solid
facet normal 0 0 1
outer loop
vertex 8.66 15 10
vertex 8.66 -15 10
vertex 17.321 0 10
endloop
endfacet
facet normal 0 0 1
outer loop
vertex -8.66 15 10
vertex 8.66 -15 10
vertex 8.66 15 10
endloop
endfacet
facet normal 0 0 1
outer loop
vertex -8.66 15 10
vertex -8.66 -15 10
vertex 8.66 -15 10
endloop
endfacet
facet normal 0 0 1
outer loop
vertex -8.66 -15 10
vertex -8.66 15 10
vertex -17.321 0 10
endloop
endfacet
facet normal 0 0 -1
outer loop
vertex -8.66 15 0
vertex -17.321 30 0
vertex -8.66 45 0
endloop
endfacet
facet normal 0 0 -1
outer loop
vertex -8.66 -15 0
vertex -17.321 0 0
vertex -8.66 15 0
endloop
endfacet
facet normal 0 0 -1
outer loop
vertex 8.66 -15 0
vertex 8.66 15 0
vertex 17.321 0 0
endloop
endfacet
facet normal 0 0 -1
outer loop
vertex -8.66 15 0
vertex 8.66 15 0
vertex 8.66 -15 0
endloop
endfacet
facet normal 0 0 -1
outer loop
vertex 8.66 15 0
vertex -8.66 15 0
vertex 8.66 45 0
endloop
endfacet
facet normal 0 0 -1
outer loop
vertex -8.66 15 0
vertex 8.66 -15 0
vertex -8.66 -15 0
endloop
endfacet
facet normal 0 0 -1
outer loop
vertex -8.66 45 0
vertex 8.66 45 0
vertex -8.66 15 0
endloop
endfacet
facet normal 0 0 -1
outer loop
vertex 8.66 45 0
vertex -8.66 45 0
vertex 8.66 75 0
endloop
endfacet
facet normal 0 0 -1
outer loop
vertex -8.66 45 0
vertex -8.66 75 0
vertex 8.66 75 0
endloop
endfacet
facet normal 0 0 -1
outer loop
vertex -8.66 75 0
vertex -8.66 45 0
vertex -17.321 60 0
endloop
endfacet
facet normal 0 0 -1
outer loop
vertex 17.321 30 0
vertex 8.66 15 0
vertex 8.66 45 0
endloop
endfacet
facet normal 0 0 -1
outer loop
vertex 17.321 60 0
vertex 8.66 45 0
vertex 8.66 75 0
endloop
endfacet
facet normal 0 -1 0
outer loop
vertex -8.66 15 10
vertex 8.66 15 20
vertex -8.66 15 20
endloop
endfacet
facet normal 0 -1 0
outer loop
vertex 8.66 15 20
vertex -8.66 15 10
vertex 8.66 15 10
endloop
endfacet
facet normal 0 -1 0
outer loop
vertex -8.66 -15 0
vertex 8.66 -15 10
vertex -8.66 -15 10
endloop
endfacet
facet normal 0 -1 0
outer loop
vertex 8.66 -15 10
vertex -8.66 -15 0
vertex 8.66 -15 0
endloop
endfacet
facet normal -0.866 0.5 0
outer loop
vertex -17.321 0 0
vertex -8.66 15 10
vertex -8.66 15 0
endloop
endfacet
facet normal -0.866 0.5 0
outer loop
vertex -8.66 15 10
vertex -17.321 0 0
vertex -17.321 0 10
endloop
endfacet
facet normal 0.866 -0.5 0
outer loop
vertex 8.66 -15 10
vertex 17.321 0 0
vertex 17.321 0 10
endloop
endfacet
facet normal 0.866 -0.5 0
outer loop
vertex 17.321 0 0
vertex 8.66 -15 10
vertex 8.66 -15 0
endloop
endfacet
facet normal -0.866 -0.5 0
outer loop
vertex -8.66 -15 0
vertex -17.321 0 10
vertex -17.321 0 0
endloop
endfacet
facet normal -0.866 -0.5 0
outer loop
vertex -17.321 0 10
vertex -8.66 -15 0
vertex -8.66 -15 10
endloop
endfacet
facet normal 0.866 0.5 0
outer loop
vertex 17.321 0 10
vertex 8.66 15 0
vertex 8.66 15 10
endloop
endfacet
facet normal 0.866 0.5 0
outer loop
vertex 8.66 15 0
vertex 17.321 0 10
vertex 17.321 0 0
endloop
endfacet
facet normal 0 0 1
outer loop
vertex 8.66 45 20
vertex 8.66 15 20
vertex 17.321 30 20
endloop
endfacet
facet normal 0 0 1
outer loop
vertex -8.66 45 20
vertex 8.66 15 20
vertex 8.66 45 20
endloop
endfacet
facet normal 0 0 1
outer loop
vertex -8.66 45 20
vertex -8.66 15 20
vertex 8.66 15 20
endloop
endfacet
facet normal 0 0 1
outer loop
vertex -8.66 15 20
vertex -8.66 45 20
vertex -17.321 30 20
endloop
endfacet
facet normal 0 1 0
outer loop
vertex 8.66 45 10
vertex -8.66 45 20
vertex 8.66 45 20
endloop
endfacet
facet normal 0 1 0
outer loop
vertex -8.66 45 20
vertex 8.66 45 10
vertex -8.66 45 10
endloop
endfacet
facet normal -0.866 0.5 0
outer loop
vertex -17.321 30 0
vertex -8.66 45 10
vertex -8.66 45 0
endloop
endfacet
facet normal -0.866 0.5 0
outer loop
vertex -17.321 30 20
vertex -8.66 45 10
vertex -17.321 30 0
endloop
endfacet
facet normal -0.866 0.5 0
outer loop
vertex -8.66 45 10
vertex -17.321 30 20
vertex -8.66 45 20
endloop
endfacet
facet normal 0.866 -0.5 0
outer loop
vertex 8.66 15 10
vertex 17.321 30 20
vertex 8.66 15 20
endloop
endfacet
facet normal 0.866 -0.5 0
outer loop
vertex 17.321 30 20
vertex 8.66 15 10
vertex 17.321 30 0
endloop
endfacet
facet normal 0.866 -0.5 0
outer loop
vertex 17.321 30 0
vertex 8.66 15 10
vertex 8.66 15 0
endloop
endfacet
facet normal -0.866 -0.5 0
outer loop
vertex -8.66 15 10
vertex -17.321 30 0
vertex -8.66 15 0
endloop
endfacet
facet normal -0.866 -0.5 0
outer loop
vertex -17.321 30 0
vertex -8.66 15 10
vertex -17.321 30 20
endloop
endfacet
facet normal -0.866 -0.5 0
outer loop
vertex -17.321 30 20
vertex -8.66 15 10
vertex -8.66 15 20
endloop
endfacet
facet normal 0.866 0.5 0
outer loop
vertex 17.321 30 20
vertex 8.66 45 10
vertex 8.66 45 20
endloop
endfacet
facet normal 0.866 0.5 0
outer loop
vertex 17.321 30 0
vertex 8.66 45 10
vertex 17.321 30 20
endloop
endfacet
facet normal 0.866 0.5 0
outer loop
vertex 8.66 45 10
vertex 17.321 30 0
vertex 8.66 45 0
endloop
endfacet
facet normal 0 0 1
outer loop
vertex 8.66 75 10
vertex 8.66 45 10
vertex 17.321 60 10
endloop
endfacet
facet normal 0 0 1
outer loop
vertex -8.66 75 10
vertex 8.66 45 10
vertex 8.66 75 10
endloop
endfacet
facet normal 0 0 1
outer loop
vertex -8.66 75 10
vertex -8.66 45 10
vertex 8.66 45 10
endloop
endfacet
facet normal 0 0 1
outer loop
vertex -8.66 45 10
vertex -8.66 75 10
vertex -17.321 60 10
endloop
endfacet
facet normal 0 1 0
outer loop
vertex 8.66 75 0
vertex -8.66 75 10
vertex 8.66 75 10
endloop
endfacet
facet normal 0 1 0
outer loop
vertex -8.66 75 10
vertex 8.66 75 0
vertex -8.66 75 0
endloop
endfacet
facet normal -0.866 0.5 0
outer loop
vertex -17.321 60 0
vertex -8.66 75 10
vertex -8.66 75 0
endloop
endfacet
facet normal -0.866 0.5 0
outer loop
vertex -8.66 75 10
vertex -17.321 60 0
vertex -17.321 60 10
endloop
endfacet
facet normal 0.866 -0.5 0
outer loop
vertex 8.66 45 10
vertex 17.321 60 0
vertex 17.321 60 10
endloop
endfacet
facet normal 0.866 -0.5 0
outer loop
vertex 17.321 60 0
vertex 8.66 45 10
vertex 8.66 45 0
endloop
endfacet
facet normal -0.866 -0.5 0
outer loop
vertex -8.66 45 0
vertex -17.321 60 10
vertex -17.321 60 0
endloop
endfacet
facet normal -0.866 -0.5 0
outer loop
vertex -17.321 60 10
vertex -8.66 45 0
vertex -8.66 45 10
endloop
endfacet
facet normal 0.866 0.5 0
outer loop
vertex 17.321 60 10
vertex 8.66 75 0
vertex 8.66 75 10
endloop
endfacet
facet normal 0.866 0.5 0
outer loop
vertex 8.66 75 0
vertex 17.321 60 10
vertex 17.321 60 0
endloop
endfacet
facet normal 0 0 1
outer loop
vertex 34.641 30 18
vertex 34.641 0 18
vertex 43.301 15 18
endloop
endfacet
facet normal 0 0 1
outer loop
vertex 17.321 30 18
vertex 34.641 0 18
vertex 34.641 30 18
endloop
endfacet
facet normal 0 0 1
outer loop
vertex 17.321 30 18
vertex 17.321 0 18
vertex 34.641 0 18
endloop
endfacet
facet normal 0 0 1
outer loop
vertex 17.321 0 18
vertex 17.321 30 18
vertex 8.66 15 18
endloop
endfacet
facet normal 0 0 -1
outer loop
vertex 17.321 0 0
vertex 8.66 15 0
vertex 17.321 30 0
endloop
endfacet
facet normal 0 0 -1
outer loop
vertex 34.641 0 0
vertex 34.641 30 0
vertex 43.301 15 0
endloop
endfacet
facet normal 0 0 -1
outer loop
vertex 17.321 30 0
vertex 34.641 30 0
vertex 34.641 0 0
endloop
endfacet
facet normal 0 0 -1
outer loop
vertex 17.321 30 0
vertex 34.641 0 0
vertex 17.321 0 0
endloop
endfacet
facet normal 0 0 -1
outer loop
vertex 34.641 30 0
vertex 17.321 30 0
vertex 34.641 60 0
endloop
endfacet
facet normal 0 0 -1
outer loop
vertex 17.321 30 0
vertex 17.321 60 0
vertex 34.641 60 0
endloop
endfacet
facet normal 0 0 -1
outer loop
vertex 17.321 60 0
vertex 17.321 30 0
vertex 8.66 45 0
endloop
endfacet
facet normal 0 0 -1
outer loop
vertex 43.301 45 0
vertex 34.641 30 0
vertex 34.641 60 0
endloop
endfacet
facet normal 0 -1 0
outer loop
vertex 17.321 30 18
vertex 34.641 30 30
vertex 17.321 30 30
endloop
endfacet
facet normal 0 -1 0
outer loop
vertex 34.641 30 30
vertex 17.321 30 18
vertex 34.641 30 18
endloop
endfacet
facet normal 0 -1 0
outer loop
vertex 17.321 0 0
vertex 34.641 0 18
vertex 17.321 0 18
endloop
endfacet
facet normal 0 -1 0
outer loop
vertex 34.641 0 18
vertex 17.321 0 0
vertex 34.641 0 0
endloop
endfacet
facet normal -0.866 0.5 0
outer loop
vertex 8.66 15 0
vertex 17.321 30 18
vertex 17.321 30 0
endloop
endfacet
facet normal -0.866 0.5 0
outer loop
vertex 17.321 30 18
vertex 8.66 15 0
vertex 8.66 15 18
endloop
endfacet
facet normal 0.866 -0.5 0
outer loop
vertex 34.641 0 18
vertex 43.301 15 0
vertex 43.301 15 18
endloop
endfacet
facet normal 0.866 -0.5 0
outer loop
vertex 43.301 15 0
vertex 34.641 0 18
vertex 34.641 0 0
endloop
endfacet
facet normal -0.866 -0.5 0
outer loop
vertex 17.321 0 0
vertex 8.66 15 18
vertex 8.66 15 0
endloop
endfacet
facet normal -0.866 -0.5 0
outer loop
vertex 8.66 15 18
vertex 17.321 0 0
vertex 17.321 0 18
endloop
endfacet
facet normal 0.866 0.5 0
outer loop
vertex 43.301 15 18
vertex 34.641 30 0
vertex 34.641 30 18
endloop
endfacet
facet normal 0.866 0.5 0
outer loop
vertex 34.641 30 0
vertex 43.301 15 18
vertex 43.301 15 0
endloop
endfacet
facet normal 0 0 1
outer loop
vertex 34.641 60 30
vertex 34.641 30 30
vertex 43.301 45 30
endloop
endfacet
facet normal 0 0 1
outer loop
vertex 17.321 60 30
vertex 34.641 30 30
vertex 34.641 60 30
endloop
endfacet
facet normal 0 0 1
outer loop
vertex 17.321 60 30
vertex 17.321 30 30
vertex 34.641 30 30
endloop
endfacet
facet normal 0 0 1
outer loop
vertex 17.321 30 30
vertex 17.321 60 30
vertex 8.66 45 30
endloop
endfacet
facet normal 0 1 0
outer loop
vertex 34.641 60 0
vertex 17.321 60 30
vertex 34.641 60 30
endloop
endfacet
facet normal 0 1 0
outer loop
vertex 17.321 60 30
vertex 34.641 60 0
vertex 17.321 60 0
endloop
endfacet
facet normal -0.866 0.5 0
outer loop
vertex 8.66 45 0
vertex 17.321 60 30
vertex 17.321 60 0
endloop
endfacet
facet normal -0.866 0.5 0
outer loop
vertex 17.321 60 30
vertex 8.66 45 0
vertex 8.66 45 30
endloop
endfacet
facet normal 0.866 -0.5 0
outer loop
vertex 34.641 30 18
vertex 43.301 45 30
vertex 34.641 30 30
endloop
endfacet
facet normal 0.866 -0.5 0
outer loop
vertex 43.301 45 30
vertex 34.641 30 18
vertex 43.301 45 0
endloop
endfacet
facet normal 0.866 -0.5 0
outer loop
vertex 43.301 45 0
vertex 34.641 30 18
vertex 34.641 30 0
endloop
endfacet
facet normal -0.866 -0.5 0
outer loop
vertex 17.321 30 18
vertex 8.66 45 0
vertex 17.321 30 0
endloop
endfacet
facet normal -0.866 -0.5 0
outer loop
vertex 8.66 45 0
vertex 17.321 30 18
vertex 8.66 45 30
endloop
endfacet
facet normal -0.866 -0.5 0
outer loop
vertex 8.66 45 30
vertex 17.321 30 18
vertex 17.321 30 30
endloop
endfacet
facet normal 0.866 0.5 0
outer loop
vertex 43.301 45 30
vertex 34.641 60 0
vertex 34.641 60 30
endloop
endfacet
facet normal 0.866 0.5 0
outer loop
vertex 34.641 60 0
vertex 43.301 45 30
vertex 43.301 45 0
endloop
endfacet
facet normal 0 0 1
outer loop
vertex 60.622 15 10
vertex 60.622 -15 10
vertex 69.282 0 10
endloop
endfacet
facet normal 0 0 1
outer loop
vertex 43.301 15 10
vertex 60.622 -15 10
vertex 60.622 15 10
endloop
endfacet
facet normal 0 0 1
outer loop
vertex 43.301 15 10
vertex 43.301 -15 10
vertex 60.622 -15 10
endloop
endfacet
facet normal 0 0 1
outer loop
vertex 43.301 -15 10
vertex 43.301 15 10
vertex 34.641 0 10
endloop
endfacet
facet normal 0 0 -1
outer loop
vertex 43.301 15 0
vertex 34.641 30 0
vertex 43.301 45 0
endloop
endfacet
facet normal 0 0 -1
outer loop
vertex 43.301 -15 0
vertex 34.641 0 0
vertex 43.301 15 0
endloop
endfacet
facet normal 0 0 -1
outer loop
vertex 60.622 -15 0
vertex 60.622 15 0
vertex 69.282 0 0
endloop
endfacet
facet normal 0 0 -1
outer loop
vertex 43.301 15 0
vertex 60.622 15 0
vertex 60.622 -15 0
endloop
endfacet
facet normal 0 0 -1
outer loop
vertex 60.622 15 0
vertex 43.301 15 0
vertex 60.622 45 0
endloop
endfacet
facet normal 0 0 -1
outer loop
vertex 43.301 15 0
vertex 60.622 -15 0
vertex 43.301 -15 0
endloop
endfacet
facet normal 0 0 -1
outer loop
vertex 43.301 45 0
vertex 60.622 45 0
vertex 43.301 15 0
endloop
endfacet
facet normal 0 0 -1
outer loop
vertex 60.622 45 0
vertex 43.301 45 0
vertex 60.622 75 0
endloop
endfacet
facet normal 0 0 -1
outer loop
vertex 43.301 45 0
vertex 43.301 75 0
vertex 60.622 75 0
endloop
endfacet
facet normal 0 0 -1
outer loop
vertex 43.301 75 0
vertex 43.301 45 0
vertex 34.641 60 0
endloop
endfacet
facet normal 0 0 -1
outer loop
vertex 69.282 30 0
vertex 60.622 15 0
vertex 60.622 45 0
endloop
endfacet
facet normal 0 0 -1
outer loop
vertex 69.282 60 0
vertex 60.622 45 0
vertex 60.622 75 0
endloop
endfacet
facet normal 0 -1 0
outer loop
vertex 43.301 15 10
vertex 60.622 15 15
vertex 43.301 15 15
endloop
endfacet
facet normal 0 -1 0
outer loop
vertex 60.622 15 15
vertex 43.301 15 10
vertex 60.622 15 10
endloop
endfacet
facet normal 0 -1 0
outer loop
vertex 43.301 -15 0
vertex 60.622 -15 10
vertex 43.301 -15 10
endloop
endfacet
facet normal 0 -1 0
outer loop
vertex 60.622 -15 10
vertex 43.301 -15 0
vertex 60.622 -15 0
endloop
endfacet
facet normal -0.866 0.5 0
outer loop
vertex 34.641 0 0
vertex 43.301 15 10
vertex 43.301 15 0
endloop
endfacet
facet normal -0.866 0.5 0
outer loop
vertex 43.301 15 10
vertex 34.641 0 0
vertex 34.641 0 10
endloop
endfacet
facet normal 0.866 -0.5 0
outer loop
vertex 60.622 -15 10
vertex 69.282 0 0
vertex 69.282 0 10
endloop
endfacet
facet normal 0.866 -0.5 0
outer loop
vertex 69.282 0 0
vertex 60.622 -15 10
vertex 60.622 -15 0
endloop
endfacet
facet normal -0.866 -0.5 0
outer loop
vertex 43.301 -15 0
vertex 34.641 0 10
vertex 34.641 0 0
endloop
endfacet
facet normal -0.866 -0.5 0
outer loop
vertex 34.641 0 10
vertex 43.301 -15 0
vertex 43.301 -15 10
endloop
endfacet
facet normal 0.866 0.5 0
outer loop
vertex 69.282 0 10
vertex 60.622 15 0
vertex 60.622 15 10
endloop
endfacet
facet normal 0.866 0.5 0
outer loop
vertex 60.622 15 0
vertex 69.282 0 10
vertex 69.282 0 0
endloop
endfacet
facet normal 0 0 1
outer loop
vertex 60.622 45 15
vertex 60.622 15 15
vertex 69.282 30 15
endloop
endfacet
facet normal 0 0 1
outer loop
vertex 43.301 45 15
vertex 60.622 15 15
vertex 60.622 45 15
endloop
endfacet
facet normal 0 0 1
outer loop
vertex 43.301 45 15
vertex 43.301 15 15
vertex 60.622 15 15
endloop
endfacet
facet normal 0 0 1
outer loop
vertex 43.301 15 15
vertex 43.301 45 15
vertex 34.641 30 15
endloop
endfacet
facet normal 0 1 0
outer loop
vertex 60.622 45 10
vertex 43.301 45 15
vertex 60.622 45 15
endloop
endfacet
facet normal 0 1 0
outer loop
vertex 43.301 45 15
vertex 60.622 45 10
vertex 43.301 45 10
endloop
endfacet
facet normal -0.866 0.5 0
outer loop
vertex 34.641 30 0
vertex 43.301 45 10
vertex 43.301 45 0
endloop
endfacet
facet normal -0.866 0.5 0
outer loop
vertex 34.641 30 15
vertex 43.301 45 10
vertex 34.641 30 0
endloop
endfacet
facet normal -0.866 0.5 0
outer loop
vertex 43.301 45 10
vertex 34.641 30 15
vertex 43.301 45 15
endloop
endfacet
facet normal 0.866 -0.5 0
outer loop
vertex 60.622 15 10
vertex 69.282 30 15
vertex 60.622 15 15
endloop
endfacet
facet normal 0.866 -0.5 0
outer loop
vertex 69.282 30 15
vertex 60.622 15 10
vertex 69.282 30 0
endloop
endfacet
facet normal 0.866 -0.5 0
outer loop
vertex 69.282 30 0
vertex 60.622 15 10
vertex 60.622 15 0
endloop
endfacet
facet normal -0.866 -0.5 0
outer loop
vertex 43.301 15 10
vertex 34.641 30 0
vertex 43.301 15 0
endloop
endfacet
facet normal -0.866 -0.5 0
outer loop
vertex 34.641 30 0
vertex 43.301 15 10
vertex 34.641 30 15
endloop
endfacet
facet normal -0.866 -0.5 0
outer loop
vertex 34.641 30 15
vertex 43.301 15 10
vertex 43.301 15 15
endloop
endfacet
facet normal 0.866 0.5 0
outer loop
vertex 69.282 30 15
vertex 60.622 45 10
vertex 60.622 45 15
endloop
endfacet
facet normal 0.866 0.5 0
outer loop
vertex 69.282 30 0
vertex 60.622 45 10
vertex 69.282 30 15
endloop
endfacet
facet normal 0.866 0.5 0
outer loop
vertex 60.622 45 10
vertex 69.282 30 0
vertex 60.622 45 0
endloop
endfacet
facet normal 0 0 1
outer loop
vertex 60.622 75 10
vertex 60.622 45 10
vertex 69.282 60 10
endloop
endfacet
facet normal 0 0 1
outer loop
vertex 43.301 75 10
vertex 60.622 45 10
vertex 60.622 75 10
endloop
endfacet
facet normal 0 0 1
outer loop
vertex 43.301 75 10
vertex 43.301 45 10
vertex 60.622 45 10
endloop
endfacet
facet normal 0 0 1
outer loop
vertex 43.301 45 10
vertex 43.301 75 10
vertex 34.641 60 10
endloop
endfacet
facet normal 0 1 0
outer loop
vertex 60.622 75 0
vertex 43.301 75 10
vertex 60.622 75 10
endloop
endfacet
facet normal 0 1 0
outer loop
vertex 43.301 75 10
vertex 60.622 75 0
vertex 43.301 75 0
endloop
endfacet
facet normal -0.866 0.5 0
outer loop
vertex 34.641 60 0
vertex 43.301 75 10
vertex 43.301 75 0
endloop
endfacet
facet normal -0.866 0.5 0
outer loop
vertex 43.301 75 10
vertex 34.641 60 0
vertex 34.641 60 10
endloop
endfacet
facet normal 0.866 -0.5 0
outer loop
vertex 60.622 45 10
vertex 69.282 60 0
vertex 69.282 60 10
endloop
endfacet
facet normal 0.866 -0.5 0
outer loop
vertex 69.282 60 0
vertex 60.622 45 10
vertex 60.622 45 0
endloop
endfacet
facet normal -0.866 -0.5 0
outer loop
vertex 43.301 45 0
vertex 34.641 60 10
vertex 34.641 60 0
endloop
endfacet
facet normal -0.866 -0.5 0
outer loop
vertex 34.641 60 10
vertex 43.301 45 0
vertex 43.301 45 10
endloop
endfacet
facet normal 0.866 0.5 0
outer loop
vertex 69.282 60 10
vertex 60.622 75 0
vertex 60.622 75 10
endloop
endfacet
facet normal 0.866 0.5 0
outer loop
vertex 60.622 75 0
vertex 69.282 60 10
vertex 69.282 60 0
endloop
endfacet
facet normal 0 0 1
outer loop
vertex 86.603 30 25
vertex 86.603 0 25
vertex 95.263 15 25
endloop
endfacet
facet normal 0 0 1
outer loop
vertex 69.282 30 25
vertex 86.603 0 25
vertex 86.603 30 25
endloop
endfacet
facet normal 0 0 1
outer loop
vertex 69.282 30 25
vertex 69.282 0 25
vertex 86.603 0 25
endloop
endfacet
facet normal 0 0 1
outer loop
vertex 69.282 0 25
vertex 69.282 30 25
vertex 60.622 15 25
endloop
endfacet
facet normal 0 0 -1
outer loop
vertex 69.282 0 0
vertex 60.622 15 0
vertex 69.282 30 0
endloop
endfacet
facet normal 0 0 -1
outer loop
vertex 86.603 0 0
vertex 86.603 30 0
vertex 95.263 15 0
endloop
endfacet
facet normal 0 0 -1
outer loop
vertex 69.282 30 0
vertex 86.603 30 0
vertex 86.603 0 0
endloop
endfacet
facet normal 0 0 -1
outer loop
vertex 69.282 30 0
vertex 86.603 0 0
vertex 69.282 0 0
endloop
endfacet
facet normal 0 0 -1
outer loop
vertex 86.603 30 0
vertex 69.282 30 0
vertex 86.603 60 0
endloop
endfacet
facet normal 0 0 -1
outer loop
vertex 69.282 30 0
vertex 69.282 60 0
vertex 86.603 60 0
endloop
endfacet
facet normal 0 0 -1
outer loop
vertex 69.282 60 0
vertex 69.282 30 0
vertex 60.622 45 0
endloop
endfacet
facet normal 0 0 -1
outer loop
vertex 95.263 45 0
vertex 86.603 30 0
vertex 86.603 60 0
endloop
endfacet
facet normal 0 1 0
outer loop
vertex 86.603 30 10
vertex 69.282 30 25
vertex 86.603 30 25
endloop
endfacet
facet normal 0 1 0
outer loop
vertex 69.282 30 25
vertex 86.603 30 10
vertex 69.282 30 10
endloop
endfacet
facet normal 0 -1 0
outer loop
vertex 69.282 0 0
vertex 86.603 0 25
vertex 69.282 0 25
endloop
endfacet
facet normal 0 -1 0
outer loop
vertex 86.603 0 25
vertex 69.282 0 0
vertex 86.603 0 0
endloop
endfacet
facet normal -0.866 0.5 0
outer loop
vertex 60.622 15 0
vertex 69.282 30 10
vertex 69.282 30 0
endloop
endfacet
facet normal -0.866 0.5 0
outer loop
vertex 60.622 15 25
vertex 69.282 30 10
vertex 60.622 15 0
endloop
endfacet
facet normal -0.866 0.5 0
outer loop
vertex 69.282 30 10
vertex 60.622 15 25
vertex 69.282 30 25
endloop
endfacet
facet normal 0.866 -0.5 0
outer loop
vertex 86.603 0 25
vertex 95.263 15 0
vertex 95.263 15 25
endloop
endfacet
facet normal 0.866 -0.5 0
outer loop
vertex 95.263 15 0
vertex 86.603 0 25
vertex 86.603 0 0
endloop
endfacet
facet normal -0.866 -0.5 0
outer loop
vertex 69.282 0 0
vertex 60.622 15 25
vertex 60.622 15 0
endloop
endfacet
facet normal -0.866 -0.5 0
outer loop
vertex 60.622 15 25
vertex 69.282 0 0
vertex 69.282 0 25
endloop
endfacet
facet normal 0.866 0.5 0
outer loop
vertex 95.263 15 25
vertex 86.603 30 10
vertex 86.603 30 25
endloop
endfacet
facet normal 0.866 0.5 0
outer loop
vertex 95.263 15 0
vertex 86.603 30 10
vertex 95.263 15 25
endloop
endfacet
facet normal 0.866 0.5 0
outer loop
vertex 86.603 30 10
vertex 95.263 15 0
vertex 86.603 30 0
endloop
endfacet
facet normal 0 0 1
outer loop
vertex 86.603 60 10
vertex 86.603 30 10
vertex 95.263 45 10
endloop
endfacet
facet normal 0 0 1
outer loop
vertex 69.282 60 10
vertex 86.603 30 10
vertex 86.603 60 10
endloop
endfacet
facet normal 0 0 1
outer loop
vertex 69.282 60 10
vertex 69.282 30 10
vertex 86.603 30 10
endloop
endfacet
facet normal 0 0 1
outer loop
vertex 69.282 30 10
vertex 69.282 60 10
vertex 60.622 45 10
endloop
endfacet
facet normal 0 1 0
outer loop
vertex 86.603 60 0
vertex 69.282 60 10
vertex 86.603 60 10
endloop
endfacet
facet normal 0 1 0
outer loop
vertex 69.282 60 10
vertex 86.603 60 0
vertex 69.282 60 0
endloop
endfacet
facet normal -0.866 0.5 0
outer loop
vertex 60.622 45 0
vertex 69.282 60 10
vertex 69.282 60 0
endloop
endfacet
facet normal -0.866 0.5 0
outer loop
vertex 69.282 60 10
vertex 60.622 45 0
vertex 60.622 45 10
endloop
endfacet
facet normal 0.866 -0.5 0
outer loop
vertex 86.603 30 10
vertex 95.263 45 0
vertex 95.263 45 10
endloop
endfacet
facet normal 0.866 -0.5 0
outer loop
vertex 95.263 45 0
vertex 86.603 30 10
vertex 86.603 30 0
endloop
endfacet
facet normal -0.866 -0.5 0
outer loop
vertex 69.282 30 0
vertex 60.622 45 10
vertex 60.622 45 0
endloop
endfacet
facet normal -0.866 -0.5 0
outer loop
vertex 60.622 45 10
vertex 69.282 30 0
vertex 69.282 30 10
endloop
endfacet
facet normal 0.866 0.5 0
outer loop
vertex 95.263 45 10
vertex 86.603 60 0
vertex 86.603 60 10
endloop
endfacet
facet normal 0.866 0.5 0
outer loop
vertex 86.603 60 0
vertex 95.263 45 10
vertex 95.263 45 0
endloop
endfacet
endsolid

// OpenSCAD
/*
This is a simple script to generate 3d model base for the 3d printable game (name TBD)
You can customize it and use it as far as you refer to the original.
Author: Simmons http://www.thingiverse.com/Simmons/about
more information: www.randomlandscape.com
*/

// Dimension of the single prism
a= 30; //  [30:Small, 50:Medium, 70:Large]
//h= 10; //altezza standard


// Height prism 1
h1 = 10; // [10:35]
// Height prism 2
h2 = 20;// [10:35]
// Height prism 3
h3 = 10; // [10:35]
// Height prism 4
h4 = 18; // [10:35]
// Height prism 5
h5 = 30; // [10:35]
// Height prism 6
h6 = 10; // [10:35]
// Height prism 7
h7 = 15; // [10:35]
// Height prism 8
h8 = 10; // [10:35]
// Height prism 9
h9 = 25; // [10:35]
// Height prism 10
h10 = 10; // [10:35]

l = a*tan(30); //lato dell'esagono

// esagono 1
translate([0,0,h1/2]){
esagono(h1,a);
}

// esagono 2
translate([0,a,h2/2]){
esagono(h2,a);
}

// esagono 3
translate([0,a*2,h3/2]){
esagono(h3,a);
}

//seconda colonna
translate([l/2 + l,a/2,0]){ //l/2 + l è lo spostamento per la seconda linea
// esagono 4
translate([0,0,h4/2]){
esagono(h4,a);
}
// esagono 5
translate([0,a,h5/2]){
esagono(h5,a);
}

}//fine seconda colonna

//terza colonna
translate([l*3,0,0]){ //l*3 è lo spostamento per la terza linea
// esagono 6
translate([0,0,h6/2]){
esagono(h6,a);
}

// esagono 7
translate([0,a,h7/2]){
esagono(h7,a);
}

//esagono 8
translate([0,a*2,h8/2]){
esagono(h8,a);
}

}//fine terza colonna

//quarta colonna
translate([l/2 + 4* l,a/2,0]){ //l/2 + l è lo spostamento per la seconda linea
// esagono 9
translate([0,0,h9/2]){
esagono(h9,a);
}

// esagono 10
translate([0,a,h10/2]){
esagono(h10,a);
}

}//fine quarta colonna

module esagono ( h, distanza_lati ) {

lato= distanza_lati*tan(30);

diagonale_angoli = (lato/(sin(30)));
echo("diagonale:",diagonale_angoli);

cube([lato,distanza_lati,h], center=true);
rotate(a=[0,0,60]) {
cube([lato,distanza_lati,h], center=true);
}
rotate(a=[0,0,120]) {
cube([lato,distanza_lati,h], center=true);
}
}//fine esagono
        
